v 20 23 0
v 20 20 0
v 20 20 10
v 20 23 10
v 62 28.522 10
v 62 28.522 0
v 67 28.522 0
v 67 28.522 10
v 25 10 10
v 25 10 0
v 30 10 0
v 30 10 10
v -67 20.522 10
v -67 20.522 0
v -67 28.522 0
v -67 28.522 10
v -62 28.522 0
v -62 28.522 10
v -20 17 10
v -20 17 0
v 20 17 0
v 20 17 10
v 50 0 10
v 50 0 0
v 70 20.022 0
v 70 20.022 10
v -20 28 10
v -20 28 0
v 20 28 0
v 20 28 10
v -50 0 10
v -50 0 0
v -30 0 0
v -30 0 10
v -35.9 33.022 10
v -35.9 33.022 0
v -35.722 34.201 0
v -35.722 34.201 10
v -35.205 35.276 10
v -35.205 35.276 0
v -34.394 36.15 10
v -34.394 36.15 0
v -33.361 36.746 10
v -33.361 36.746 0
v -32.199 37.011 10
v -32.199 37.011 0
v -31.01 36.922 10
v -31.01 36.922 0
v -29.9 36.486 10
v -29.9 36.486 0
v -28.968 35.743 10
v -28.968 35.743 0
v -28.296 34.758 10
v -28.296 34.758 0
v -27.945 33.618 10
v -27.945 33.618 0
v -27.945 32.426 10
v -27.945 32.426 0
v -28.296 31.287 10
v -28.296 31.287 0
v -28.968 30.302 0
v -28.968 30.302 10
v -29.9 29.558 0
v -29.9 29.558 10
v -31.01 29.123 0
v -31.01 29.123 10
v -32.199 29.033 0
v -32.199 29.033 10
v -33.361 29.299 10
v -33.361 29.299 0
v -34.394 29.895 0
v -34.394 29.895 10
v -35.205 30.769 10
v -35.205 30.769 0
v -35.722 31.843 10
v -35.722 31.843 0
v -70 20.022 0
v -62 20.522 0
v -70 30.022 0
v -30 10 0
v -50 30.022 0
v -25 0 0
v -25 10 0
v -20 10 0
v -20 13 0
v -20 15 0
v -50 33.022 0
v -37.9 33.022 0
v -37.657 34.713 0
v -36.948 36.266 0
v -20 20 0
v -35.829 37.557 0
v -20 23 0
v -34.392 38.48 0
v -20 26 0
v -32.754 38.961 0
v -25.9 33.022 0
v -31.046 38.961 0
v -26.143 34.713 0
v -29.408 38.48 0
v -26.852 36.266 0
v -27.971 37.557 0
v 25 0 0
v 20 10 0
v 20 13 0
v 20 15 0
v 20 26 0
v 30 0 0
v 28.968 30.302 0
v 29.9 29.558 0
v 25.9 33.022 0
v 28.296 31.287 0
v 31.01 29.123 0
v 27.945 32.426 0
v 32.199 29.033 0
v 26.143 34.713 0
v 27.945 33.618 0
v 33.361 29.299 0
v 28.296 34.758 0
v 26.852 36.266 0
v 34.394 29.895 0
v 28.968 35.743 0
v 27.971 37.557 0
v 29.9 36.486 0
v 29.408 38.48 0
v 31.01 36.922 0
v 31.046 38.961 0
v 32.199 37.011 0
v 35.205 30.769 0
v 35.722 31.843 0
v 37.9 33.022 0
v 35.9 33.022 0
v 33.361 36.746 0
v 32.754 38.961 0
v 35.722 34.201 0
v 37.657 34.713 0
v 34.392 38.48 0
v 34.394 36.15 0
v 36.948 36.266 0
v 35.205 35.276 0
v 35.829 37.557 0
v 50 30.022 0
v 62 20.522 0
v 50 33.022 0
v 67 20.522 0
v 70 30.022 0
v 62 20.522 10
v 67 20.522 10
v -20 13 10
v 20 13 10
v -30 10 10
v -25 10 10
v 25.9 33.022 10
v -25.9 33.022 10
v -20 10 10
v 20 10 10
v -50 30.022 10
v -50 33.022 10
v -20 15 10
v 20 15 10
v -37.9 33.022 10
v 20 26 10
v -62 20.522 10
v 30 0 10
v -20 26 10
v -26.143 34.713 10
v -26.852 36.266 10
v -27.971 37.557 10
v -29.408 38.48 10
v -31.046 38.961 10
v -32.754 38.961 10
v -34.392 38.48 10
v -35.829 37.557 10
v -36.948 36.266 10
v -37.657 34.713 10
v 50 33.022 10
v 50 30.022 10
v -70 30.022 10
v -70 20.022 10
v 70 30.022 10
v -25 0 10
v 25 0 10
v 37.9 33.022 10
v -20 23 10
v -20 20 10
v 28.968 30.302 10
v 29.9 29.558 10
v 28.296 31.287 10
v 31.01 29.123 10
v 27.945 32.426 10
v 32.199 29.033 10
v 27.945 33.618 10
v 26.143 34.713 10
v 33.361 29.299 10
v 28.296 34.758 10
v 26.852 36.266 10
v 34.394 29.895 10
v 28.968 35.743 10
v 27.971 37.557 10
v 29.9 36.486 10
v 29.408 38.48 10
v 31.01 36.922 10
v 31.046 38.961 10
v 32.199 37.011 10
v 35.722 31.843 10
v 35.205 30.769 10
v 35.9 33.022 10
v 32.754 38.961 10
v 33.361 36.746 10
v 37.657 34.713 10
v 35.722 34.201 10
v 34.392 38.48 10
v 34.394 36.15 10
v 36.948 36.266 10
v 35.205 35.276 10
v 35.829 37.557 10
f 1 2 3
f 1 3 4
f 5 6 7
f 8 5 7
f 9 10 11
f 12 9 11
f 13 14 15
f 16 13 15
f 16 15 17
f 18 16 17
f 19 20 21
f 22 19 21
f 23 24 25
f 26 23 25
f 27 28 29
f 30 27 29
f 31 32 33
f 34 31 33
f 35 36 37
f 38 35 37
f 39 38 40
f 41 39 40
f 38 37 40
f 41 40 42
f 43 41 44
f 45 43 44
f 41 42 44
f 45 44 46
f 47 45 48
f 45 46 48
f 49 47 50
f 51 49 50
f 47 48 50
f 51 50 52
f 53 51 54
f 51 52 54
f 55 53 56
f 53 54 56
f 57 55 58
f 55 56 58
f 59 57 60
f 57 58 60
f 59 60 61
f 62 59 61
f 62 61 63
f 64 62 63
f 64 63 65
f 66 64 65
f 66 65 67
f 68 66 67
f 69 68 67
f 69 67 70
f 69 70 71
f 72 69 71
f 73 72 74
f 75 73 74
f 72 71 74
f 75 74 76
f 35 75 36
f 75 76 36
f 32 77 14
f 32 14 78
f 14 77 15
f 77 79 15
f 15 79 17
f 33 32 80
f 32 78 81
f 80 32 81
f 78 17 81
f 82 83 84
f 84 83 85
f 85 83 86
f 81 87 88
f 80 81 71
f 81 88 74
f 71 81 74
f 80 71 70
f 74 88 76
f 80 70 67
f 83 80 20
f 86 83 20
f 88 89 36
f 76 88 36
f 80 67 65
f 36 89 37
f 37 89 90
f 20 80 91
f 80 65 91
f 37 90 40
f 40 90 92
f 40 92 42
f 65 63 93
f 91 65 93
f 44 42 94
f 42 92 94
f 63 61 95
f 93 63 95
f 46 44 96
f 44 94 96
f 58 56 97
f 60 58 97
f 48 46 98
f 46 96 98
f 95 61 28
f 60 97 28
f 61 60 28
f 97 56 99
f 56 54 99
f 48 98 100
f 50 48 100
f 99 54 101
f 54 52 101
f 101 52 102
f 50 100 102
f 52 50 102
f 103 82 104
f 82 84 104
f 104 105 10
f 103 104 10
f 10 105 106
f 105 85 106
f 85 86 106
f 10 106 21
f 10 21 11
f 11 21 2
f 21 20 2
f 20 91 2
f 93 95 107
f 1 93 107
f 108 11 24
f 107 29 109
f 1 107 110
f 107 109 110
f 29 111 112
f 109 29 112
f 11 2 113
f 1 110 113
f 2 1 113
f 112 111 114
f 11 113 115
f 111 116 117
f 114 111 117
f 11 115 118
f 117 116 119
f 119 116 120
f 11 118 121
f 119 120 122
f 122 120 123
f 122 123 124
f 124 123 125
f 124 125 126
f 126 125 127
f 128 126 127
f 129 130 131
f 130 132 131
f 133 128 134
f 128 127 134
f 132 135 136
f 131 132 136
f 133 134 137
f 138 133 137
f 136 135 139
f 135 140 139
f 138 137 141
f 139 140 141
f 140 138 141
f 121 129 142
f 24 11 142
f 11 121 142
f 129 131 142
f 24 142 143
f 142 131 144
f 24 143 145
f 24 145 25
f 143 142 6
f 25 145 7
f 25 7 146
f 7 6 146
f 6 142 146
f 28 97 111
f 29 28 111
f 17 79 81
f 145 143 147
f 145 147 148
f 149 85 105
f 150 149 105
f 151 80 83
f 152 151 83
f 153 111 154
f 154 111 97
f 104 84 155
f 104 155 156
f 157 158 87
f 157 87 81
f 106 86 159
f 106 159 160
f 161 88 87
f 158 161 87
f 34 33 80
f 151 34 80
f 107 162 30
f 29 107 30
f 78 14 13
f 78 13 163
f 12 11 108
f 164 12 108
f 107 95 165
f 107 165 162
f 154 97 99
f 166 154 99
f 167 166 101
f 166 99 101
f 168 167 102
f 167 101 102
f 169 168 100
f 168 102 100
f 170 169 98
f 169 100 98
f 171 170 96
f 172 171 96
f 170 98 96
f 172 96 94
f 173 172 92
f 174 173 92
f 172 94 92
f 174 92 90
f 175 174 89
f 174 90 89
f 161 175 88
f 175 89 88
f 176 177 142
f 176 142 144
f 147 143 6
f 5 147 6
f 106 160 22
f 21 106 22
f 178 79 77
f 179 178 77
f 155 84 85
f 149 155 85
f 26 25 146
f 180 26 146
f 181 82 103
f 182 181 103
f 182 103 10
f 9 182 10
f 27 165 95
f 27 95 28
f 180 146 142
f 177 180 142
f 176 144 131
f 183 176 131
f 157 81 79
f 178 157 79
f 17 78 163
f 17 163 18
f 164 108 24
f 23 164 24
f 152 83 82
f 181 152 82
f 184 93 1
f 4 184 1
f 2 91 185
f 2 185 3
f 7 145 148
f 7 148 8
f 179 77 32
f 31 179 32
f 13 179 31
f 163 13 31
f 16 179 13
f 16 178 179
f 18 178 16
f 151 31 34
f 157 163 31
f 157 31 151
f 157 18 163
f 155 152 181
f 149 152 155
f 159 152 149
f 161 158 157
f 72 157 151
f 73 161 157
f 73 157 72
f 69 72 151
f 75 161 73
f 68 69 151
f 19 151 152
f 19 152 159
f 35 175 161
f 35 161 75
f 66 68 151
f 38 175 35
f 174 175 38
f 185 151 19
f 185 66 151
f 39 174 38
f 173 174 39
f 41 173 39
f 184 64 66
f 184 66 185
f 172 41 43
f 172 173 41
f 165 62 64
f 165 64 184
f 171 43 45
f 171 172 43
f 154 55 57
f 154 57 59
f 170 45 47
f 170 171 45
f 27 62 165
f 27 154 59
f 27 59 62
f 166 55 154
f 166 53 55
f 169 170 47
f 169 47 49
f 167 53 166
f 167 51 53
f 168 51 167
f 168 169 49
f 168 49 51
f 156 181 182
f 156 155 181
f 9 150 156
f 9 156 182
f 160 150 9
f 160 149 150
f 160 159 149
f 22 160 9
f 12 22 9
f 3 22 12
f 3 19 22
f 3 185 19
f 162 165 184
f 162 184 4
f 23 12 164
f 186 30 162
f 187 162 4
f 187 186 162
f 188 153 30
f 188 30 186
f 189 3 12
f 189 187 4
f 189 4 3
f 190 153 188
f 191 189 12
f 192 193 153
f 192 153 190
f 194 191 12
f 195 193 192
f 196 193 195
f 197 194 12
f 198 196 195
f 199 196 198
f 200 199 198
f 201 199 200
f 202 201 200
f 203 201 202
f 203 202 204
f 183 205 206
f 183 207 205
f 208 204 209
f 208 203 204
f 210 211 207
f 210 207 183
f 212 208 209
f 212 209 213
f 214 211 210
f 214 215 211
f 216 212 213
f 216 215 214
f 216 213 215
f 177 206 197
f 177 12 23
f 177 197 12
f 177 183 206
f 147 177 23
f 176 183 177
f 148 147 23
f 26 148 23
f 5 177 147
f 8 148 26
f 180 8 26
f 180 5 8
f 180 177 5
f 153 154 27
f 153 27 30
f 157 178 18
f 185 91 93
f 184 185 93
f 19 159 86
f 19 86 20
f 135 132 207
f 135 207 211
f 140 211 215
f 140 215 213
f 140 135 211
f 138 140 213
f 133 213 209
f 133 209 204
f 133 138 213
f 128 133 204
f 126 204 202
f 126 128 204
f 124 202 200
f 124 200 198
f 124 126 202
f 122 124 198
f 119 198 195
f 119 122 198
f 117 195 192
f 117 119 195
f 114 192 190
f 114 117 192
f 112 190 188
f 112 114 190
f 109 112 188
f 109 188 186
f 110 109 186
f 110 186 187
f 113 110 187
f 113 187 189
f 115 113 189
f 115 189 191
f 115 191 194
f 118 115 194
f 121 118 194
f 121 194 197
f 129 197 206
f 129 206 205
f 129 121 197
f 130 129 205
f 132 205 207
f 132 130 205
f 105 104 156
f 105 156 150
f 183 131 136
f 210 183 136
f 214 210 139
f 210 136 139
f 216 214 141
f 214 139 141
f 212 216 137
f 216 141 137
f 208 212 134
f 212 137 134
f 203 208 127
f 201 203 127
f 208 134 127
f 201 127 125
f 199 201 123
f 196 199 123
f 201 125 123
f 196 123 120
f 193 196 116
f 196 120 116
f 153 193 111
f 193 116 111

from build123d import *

# Parameters (mm, degrees)
CROQUIS1_W              = 40
CROQUIS1_H              = 3
CROQUIS1_H_2            = 2
CROQUIS1_W_2            = 5
CROQUIS1_H_3            = 8
CROQUIS1_R              = 4
SALIENTE_EXTRUIR1_DEPTH = 10


with BuildPart() as part:
    # Croquis1 → Saliente-Extruir1 (new body)
    with BuildSketch(Plane.XY):
        with BuildLine():
            Line((-25, 10), (-25, 0))
            Line((-25, 0), (25, 0))
            Line((25, 0), (25, 10))
            Line((25, 10), (30, 10))
            Line((30, 10), (30, 0))
            Line((30, 0), (50, 0))
            Line((50, 0), (70, 20.022237637))
            Line((70, 20.022237637), (70, 30.022237637))
            Line((70, 30.022237637), (50, 30.022237637))
            Line((50, 30.022237637), (50, 33.022237637))
            Line((50, 33.022237637), (37.9, 33.022237637))
            ThreePointArc((37.9, 33.022237637), (31.9, 39.022237637), (25.9, 33.022237637))
            Line((25.9, 33.022237637), (-25.9, 33.022237637))
            ThreePointArc((-25.9, 33.022237637), (-31.9, 39.022237637), (-37.9, 33.022237637))
            Line((-37.9, 33.022237637), (-50, 33.022237637))
            Line((-50, 33.022237637), (-50, 30.022237637))
            Line((-50, 30.022237637), (-70, 30.022237637))
            Line((-70, 30.022237637), (-70, 20.022237637))
            Line((-70, 20.022237637), (-50, 0))
            Line((-50, 0), (-30, 0))
            Line((-30, 0), (-30, 10))
            Line((-30, 10), (-25, 10))
        make_face()
        with Locations((0, 11.5)):
            Rectangle(CROQUIS1_W, CROQUIS1_H, mode=Mode.SUBTRACT)
        with Locations((0, 16)):
            Rectangle(CROQUIS1_W, CROQUIS1_H_2, mode=Mode.SUBTRACT)
        with Locations((-64.5, 24.522237637)):
            Rectangle(CROQUIS1_W_2, CROQUIS1_H_3, mode=Mode.SUBTRACT)
        with BuildLine():
            ThreePointArc((-27.9, 33.022237637), (-31.9, 29.022237637), (-35.9, 33.022237637))
            ThreePointArc((-35.9, 33.022237637), (-31.9, 37.022237637), (-27.9, 33.022237637))
        make_face(mode=Mode.SUBTRACT)
        with Locations((0, 21.5)):
            Rectangle(CROQUIS1_W, CROQUIS1_H, mode=Mode.SUBTRACT)
        with Locations((0, 27)):
            Rectangle(CROQUIS1_W, CROQUIS1_H_2, mode=Mode.SUBTRACT)
        with Locations((64.5, 24.522237637)):
            Rectangle(CROQUIS1_W_2, CROQUIS1_H_3, mode=Mode.SUBTRACT)
        with Locations((31.9, 33.022237637)):
            Circle(CROQUIS1_R, mode=Mode.SUBTRACT)
    extrude(amount=SALIENTE_EXTRUIR1_DEPTH)


solid = part.part
